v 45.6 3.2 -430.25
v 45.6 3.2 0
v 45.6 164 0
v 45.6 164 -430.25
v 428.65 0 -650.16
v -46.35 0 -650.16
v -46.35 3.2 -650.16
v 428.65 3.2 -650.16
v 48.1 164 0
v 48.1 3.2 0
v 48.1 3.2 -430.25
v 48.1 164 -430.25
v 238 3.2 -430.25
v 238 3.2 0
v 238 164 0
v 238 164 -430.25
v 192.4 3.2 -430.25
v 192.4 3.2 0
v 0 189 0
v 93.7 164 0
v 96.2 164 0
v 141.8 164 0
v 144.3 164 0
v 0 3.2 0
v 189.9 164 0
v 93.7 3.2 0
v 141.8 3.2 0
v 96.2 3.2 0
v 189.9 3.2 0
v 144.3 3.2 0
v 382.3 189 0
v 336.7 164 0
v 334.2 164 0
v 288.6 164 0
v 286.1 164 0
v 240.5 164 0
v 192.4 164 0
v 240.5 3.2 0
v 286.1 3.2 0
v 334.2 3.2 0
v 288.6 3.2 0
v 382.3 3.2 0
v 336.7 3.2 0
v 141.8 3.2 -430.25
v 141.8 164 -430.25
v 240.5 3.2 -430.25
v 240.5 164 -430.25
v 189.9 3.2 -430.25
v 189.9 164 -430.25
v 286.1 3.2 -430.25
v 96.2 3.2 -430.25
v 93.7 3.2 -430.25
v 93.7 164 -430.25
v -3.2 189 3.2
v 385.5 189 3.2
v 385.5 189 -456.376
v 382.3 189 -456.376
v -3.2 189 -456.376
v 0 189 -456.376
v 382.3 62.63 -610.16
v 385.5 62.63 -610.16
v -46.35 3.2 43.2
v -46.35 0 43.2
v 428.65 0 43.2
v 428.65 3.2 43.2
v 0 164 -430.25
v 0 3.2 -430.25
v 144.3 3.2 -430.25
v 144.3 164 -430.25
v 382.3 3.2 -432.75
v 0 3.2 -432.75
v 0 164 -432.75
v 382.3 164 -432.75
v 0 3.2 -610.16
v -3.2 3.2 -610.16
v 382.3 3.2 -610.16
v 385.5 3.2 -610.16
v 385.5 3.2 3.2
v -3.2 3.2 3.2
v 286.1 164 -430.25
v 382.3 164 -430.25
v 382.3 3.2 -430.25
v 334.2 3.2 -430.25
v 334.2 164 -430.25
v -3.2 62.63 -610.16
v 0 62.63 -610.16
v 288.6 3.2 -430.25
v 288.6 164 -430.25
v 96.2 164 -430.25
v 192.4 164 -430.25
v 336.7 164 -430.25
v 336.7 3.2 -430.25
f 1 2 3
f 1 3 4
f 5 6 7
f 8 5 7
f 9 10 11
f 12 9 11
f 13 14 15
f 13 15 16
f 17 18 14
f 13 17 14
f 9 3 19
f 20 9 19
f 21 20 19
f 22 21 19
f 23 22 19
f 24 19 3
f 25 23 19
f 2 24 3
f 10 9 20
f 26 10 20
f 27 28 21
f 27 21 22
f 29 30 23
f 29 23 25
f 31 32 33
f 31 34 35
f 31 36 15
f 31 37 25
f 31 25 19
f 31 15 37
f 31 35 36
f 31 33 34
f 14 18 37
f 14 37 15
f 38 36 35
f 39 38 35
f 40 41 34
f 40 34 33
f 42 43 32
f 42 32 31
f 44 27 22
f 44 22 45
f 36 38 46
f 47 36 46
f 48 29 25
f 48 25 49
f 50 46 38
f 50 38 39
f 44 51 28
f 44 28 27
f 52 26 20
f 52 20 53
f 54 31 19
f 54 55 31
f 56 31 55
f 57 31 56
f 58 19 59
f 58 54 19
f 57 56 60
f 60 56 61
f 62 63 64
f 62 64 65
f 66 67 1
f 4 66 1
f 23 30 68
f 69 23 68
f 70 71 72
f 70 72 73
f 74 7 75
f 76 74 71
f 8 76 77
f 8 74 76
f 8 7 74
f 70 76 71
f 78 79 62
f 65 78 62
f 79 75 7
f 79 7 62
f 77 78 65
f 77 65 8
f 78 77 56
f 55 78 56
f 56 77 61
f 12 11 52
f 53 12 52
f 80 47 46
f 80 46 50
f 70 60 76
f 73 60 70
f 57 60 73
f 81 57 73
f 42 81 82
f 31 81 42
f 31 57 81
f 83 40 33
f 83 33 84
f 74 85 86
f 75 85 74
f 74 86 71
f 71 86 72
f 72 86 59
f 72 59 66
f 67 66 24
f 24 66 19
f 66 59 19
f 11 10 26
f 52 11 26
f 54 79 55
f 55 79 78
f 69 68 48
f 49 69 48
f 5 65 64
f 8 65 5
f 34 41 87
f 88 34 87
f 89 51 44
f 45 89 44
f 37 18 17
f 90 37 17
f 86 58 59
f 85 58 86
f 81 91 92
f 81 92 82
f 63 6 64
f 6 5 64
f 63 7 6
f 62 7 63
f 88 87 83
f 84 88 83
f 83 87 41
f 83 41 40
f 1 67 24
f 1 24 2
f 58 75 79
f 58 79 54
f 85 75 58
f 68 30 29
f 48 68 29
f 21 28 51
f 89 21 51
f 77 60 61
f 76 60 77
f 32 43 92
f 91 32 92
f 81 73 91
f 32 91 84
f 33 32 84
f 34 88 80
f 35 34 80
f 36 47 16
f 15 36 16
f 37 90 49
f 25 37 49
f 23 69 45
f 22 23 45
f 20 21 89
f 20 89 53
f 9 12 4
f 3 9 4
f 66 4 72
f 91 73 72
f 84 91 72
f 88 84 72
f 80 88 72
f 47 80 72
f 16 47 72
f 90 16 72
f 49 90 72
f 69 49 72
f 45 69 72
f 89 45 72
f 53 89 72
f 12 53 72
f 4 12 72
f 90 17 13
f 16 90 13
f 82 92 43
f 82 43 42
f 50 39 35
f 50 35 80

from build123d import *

# Parameters (mm, degrees)
SKETCH1_W            = 388.7
SKETCH1_H            = 435.95
SKETCH1_W_2          = 45.6
SKETCH1_H_2          = 430.25
BOSS_EXTRUDE1_DEPTH  = 189
BOSS_EXTRUDE2_START  = -433.45
SKETCH2_W            = 388.7
SKETCH2_H            = 3.2
BOSS_EXTRUDE2_DEPTH  = 430.25
CUT_EXTRUDE1_DEPTH   = 25
BOSS_EXTRUDE4_DEPTH  = 3.2
BOSS_EXTRUDE5_DEPTH  = 3.2
BOSS_EXTRUDE6_REACH  = 791.664
CUT_EXTRUDE2_REACH   = 793.231
SKETCH11_W           = 52.59
SKETCH11_H           = 168.019571709
BOSS_EXTRUDE7_DEPTH  = 3.2
BOSS_EXTRUDE8_DEPTH  = 3.2
SKETCH14_W           = 388.7
SKETCH14_H           = 3.2
BOSS_EXTRUDE9_DEPTH  = 40
SKETCH15_W           = 388.7
SKETCH15_H           = 3.2
BOSS_EXTRUDE10_DEPTH = 40
SKETCH16_W           = 693.36
SKETCH16_H           = 3.2
BOSS_EXTRUDE11_DEPTH = 43.15
SKETCH17_W           = 693.36
SKETCH17_H           = 3.2
BOSS_EXTRUDE12_DEPTH = 43.15


with BuildPart() as part:
    # Sketch1 → Boss-Extrude1 (new body)
    with BuildSketch(Plane(origin=(0, 0, 0), x_dir=(1, 0, 0), z_dir=(0, 1, 0))):
        with Locations((191.15, 214.775)):
            Rectangle(SKETCH1_W, SKETCH1_H)
        with Locations((22.8, 215.125)):
            Rectangle(SKETCH1_W_2, SKETCH1_H_2, mode=Mode.SUBTRACT)
        with Locations((359.5, 215.125)):
            Rectangle(SKETCH1_W_2, SKETCH1_H_2, mode=Mode.SUBTRACT)
        with Locations((70.9, 215.125)):
            Rectangle(SKETCH1_W_2, SKETCH1_H_2, mode=Mode.SUBTRACT)
        with Locations((119, 215.125)):
            Rectangle(SKETCH1_W_2, SKETCH1_H_2, mode=Mode.SUBTRACT)
        with Locations((167.1, 215.125)):
            Rectangle(SKETCH1_W_2, SKETCH1_H_2, mode=Mode.SUBTRACT)
        with Locations((215.2, 215.125)):
            Rectangle(SKETCH1_W_2, SKETCH1_H_2, mode=Mode.SUBTRACT)
        with Locations((263.3, 215.125)):
            Rectangle(SKETCH1_W_2, SKETCH1_H_2, mode=Mode.SUBTRACT)
        with Locations((311.4, 215.125)):
            Rectangle(SKETCH1_W_2, SKETCH1_H_2, mode=Mode.SUBTRACT)
    extrude(amount=BOSS_EXTRUDE1_DEPTH)

    # Sketch2 → Boss-Extrude2 (add)
    with BuildSketch(Plane.XY.offset(3.2).offset(BOSS_EXTRUDE2_START)):
        with Locations((191.15, 1.6)):
            Rectangle(SKETCH2_W, SKETCH2_H)
    extrude(amount=BOSS_EXTRUDE2_DEPTH)

    # Sketch3 → Cut-Extrude1 (cut)
    with BuildSketch(Plane(origin=(0, 189, 0), x_dir=(1, 0, 0), z_dir=(0, 1, 0))):
        Polygon((0, 430.25), (0, 432.75), (382.3, 432.75), (382.3, 430.25), (336.7, 430.25), (336.7, 0), (334.2, 0), (334.2, 430.25), (288.6, 430.25), (288.6, 0), (286.1, 0), (286.1, 430.25), (240.5, 430.25), (240.5, 0), (238, 0), (238, 430.25), (192.4, 430.25), (192.4, 0), (189.9, 0), (189.9, 430.25), (144.3, 430.25), (144.3, 0), (141.8, 0), (141.8, 430.25), (96.2, 430.25), (96.2, 0), (93.7, 0), (93.7, 430.25), (48.1, 430.25), (48.1, 0), (45.6, 0), (45.6, 430.25), align=None)
    extrude(amount=-CUT_EXTRUDE1_DEPTH, mode=Mode.SUBTRACT)

    # Sketch4 → Boss-Extrude4 (add)
    with BuildSketch(Plane(origin=(385.5, 0, 0), x_dir=(0, 0, -1), z_dir=(1, 0, 0))):
        Polygon((432.75, 189), (662.75, 0), (432.75, 0), align=None)
    extrude(amount=-BOSS_EXTRUDE4_DEPTH)

    # Sketch7 → Boss-Extrude5 (add)
    with BuildSketch(Plane.ZY.offset(3.2)):
        Polygon((-432.75, 164), (-432.75, 189), (-662.75, 0), (-432.75, 0), align=None)
    extrude(amount=-BOSS_EXTRUDE5_DEPTH)

    # Sketch9 → Boss-Extrude6 (add, up to next)
    with BuildSketch(Plane(origin=(0, 0, 0), x_dir=(0, 0, -1), z_dir=(1, 0, 0)), mode=Mode.PRIVATE) as boss_extrude6_sk1:
        Polygon((662.75, 0), (658.855820106, 3.2), (432.75, 3.2), (432.75, 0), align=None)
    boss_extrude6_tool1 = extrude(boss_extrude6_sk1.sketch, amount=BOSS_EXTRUDE6_REACH, mode=Mode.PRIVATE) - part.part
    add(boss_extrude6_tool1.solids().sort_by_distance((0, 1.595446, -546.779226))[0])

    # Sketch11 → Cut-Extrude2 (cut, up to next)
    with BuildSketch(Plane(origin=(385.5, 0, 0), x_dir=(0, 0, -1), z_dir=(1, 0, 0)), mode=Mode.PRIVATE) as cut_extrude2_sk1:
        with Locations((636.455, 84.009785855)):
            Rectangle(SKETCH11_W, SKETCH11_H)
    cut_extrude2_tool1 = extrude(cut_extrude2_sk1.sketch, amount=-CUT_EXTRUDE2_REACH, mode=Mode.PRIVATE) & part.part
    add(cut_extrude2_tool1.solids().sort_by_distance((385.5, 84.009786, -636.455))[0], mode=Mode.SUBTRACT)

    # Sketch12 → Boss-Extrude7 (add)
    with BuildSketch(Plane(origin=(385.5, 0, 0), x_dir=(0, 0, -1), z_dir=(1, 0, 0))):
        Polygon((456.376412276, 189), (610.16, 62.630008348), (610.16, 43.21526087), (432.75, 189), align=None)
    extrude(amount=-BOSS_EXTRUDE7_DEPTH)

    # Sketch13 → Boss-Extrude8 (add)
    with BuildSketch(Plane.ZY.offset(3.2)):
        Polygon((-610.16, 62.630008348), (-610.16, 43.21526087), (-432.75, 189), (-456.376412276, 189), align=None)
    extrude(amount=-BOSS_EXTRUDE8_DEPTH)

    # Sketch14 → Boss-Extrude9 (add)
    with BuildSketch(Plane(origin=(0, 0, -610.16), x_dir=(-1, 0, 0), z_dir=(0, 0, -1))):
        with Locations((-191.15, 1.6)):
            Rectangle(SKETCH14_W, SKETCH14_H)
    extrude(amount=BOSS_EXTRUDE9_DEPTH)

    # Sketch15 → Boss-Extrude10 (add)
    with BuildSketch(Plane.XY.offset(3.2)):
        with Locations((191.15, 1.6)):
            Rectangle(SKETCH15_W, SKETCH15_H)
    extrude(amount=BOSS_EXTRUDE10_DEPTH)

    # Sketch16 → Boss-Extrude11 (add)
    with BuildSketch(Plane(origin=(385.5, 0, 0), x_dir=(0, 0, -1), z_dir=(1, 0, 0))):
        with Locations((303.48, 1.6)):
            Rectangle(SKETCH16_W, SKETCH16_H)
    extrude(amount=BOSS_EXTRUDE11_DEPTH)

    # Sketch17 → Boss-Extrude12 (add)
    with BuildSketch(Plane.ZY.offset(3.2)):
        with Locations((-303.48, 1.6)):
            Rectangle(SKETCH17_W, SKETCH17_H)
    extrude(amount=BOSS_EXTRUDE12_DEPTH)


solid = part.part
